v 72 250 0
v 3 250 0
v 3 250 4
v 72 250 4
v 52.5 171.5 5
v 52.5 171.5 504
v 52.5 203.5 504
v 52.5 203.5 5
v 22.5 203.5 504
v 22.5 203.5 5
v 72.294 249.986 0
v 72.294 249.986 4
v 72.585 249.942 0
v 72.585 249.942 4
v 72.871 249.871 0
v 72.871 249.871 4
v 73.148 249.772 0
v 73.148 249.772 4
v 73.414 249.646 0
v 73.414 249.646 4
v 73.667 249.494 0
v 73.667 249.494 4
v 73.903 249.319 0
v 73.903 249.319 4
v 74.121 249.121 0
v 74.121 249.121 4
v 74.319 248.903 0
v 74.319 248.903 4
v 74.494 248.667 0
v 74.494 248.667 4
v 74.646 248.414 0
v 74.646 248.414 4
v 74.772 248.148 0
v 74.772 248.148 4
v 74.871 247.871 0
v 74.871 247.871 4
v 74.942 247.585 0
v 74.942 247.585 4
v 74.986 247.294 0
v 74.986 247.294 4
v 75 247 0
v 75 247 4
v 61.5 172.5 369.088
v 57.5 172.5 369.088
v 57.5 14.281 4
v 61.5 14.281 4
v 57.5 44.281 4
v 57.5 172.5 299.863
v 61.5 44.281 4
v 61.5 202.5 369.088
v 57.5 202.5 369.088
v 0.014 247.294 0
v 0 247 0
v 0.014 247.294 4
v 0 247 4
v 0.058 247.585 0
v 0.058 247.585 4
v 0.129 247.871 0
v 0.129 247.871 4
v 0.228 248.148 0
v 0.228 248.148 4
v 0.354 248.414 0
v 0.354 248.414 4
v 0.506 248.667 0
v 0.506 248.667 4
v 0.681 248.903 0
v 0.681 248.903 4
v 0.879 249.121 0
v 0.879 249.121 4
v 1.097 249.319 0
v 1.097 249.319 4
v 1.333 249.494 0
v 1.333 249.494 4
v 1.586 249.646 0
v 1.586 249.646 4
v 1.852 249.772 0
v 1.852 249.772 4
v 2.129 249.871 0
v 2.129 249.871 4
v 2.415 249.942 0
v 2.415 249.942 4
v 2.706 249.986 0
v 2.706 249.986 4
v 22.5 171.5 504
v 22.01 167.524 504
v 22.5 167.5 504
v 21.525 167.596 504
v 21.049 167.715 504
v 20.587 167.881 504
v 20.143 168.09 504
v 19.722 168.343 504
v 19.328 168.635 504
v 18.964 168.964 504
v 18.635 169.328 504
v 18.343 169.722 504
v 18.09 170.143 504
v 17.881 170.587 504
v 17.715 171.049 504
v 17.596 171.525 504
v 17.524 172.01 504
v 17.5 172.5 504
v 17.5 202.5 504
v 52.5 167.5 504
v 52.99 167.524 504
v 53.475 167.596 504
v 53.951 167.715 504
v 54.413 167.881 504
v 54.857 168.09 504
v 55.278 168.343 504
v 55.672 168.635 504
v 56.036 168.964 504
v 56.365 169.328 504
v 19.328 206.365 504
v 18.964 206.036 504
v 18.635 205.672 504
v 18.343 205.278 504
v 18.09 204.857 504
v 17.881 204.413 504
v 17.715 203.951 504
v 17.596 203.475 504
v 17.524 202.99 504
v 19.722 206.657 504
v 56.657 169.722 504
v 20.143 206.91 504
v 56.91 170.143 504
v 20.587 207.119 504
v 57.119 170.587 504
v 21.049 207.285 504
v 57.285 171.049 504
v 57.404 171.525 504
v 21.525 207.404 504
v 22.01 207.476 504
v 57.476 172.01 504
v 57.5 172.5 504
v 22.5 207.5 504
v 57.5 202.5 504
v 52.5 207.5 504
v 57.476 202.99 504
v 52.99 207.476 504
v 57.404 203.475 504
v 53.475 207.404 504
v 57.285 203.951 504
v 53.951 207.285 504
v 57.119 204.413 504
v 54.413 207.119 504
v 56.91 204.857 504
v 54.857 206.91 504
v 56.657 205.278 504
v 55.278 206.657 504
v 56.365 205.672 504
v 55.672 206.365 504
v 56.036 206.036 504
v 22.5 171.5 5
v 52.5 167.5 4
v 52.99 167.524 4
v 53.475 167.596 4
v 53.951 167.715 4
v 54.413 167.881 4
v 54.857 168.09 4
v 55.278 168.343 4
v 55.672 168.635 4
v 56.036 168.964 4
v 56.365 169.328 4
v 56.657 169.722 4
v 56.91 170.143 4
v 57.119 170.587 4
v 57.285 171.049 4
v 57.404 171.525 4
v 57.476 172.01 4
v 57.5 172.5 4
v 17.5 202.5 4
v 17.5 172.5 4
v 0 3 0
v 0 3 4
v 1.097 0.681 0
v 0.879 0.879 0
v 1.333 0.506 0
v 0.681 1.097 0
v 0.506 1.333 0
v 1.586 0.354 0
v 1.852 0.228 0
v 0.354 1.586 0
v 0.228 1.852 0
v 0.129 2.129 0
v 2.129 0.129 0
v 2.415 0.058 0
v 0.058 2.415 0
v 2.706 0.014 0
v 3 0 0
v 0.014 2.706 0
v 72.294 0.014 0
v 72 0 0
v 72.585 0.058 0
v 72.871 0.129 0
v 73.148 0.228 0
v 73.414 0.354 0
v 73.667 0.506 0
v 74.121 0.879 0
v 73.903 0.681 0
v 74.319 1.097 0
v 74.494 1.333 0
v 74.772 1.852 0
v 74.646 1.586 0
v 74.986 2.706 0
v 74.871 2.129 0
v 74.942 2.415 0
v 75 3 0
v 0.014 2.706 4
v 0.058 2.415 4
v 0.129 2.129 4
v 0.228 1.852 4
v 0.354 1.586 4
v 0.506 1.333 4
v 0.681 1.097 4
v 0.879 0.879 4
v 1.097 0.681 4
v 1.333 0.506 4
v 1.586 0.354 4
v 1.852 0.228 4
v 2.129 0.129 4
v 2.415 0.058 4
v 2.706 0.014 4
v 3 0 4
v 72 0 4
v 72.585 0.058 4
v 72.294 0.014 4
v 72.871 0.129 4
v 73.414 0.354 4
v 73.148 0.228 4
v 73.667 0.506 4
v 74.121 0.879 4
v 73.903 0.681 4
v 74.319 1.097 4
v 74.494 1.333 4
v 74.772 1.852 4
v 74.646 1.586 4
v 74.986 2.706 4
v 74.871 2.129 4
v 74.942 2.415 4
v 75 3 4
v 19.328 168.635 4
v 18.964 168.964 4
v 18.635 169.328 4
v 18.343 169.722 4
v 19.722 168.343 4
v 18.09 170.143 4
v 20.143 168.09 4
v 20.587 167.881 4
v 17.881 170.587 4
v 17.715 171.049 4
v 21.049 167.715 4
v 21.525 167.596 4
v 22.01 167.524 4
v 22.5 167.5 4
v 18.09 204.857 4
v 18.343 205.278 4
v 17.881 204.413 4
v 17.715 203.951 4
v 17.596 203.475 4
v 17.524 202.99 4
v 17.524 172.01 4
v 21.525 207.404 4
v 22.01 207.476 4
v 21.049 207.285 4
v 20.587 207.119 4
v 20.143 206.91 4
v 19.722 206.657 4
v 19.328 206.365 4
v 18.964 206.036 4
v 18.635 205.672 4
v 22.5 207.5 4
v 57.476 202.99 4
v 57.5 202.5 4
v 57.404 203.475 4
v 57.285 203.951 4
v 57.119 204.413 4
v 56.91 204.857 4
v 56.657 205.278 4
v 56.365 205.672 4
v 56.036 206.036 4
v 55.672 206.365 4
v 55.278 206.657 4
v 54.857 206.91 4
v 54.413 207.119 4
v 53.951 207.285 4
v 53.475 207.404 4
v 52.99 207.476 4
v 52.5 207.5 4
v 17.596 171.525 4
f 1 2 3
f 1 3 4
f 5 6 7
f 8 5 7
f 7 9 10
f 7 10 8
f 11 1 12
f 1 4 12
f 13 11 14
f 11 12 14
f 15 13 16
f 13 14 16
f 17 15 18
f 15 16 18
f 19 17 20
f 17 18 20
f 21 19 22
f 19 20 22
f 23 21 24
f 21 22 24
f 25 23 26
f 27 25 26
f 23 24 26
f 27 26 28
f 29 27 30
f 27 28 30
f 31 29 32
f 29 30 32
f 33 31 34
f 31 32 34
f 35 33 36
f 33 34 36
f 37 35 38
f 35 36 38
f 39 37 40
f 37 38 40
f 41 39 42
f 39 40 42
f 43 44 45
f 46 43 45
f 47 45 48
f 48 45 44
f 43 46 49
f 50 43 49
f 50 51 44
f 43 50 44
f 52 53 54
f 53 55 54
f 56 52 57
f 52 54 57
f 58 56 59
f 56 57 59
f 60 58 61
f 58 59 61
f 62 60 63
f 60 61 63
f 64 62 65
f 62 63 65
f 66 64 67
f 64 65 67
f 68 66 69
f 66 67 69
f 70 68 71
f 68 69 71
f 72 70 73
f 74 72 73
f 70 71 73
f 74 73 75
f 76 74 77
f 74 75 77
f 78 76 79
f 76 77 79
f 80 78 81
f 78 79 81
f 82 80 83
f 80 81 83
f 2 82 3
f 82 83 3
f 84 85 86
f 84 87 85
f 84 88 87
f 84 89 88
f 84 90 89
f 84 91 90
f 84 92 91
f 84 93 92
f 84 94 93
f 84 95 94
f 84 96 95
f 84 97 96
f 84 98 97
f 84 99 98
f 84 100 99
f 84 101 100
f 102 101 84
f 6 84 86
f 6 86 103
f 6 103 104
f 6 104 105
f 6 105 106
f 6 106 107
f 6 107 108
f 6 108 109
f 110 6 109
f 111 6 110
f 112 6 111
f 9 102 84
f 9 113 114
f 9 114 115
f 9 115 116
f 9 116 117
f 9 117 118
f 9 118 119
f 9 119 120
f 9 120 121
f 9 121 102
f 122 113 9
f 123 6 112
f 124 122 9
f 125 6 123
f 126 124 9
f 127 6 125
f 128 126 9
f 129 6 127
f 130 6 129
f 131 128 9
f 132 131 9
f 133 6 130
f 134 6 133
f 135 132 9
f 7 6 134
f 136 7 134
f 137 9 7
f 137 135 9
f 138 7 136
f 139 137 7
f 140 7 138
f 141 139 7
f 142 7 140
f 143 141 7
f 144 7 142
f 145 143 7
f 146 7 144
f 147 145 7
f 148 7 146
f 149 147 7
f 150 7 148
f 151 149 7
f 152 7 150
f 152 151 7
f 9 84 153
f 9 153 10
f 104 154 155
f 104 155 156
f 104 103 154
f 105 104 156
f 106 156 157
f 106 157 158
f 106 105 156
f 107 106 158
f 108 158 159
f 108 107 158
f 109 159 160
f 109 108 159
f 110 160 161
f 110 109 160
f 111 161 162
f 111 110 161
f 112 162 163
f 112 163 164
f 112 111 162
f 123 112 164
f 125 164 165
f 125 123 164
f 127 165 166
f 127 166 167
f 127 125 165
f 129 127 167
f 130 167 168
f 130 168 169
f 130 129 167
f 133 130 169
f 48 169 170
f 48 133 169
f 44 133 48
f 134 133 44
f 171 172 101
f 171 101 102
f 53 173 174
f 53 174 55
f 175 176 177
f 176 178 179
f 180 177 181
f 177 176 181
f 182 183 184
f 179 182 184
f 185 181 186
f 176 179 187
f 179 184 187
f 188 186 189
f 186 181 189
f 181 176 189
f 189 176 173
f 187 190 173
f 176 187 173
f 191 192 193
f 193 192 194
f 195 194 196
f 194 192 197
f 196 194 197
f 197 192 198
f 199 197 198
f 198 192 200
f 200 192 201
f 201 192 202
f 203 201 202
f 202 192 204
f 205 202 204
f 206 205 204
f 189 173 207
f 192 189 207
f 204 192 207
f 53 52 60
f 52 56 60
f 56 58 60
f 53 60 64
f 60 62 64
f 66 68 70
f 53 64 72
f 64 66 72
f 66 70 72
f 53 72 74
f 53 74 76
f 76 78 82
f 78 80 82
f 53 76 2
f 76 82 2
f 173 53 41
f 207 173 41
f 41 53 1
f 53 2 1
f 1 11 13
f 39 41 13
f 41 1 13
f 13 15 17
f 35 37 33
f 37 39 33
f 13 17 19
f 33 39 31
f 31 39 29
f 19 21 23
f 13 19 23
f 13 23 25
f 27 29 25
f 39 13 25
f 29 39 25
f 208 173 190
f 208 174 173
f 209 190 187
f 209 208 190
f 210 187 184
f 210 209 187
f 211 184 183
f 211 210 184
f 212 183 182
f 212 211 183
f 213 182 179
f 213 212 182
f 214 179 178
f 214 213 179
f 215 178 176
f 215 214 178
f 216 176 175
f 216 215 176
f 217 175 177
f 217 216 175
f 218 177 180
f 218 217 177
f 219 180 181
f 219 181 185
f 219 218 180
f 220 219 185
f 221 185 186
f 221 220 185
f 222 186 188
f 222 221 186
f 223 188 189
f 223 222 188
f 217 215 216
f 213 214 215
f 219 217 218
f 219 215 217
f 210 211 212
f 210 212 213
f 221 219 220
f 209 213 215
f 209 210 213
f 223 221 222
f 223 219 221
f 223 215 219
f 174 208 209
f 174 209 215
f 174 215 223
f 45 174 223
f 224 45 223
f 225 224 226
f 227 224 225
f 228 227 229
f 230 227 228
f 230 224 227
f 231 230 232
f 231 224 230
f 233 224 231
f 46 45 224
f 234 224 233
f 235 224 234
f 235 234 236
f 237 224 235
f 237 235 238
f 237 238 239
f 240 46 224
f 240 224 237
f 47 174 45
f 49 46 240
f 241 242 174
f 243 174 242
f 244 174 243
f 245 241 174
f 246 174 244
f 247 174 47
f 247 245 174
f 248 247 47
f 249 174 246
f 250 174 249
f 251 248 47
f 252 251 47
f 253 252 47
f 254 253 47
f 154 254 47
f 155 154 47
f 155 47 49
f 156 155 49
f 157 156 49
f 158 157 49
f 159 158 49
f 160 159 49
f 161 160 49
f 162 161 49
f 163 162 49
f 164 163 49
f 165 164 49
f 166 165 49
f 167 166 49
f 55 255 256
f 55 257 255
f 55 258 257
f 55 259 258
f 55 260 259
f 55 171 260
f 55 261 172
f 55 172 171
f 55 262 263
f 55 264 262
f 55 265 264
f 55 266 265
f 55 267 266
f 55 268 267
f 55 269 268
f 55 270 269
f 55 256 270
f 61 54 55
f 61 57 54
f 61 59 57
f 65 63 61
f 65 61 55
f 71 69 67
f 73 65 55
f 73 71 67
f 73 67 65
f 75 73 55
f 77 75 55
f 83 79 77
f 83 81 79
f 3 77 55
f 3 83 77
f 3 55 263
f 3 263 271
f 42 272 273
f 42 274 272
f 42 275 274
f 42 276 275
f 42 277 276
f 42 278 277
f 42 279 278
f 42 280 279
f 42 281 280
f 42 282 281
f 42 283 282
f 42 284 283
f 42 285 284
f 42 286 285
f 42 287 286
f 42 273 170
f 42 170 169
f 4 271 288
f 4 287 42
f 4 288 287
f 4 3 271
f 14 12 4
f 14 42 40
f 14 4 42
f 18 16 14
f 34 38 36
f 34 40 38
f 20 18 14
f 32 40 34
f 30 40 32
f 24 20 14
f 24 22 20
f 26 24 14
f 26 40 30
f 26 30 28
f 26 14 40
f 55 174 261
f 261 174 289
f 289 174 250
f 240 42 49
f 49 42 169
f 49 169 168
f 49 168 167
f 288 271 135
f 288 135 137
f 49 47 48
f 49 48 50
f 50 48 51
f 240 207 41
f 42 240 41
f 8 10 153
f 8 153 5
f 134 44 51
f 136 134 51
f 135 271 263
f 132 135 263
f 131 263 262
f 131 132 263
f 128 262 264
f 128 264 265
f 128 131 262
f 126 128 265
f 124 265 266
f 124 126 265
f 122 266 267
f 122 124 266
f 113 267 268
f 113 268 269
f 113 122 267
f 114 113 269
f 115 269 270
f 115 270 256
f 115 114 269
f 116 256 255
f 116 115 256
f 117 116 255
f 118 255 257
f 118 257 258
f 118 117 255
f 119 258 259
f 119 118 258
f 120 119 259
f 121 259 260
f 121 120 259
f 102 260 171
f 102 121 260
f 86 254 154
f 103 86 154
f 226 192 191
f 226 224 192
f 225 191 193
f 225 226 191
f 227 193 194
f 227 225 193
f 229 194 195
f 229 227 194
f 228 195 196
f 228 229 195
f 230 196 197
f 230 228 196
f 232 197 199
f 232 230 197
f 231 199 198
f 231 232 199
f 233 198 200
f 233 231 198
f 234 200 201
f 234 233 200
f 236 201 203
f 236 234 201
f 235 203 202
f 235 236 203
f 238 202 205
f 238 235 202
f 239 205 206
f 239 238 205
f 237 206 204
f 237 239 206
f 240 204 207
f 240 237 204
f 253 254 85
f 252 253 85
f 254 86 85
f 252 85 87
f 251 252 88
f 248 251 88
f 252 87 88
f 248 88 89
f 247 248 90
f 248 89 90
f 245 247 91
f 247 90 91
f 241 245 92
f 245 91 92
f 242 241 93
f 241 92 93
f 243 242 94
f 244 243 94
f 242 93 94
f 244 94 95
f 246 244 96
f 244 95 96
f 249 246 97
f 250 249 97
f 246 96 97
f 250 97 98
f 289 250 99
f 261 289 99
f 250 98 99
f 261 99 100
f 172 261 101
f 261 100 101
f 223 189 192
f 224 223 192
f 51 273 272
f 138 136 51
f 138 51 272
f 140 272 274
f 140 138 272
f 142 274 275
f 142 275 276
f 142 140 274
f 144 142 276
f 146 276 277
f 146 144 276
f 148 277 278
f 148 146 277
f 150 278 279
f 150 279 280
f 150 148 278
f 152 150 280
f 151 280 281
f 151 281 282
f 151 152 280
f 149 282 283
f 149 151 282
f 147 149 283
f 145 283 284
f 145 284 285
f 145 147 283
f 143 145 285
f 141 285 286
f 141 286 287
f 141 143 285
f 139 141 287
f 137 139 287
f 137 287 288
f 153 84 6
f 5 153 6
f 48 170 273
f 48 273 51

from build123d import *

# Parameters (mm, degrees)
F0_W     = 75
F0_H     = 250
F1_DEPTH = 4
F2_W     = 40
F2_H     = 40
F3_DEPTH = 500
F4_W     = 30
F4_H     = 32
F5_DEPTH = 499
F6_R     = 5
F7_R     = 3
F9_DEPTH = 4


with BuildPart() as f1:
    # F0 (on Top) → F1 (new body)
    with BuildSketch(Plane.XY):
        with Locations((37.5, 125)):
            Rectangle(F0_W, F0_H)
    extrude(amount=F1_DEPTH)

    # F2 (on face) → F3 (join)
    with BuildSketch(Plane.XY.offset(4)):
        with Locations((37.5, 187.5)):
            Rectangle(F2_W, F2_H)
    extrude(amount=F3_DEPTH)

    # F4 (on face) → F5 (cut)
    with BuildSketch(Plane.XY.offset(504)):
        with Locations((37.5, 187.5)):
            Rectangle(F4_W, F4_H)
    extrude(amount=-F5_DEPTH, mode=Mode.SUBTRACT)

    # F6
    f6_edges = [f1.edges().sort_by_distance(p)[0] for p in [
        (57.5, 167.5, 254),
        (57.5, 207.5, 254),
        (17.5, 207.5, 254),
        (17.5, 167.5, 254),
    ]]
    fillet(f6_edges, radius=F6_R)

    # F7
    f7_edges = [f1.edges().sort_by_distance(p)[0] for p in [
        (0, 250, 2),
        (0, 0, 2),
        (75, 0, 2),
        (75, 250, 2),
    ]]
    fillet(f7_edges, radius=F7_R)

    # F8 (on face) → F9 (join)
    with BuildSketch(Plane.YZ.offset(57.5)):
        Polygon((172.5, 369.087671), (14.281406, 4), (44.281406, 4), (202.5, 369.087671), align=None)
    extrude(amount=F9_DEPTH)


solid = f1.part
